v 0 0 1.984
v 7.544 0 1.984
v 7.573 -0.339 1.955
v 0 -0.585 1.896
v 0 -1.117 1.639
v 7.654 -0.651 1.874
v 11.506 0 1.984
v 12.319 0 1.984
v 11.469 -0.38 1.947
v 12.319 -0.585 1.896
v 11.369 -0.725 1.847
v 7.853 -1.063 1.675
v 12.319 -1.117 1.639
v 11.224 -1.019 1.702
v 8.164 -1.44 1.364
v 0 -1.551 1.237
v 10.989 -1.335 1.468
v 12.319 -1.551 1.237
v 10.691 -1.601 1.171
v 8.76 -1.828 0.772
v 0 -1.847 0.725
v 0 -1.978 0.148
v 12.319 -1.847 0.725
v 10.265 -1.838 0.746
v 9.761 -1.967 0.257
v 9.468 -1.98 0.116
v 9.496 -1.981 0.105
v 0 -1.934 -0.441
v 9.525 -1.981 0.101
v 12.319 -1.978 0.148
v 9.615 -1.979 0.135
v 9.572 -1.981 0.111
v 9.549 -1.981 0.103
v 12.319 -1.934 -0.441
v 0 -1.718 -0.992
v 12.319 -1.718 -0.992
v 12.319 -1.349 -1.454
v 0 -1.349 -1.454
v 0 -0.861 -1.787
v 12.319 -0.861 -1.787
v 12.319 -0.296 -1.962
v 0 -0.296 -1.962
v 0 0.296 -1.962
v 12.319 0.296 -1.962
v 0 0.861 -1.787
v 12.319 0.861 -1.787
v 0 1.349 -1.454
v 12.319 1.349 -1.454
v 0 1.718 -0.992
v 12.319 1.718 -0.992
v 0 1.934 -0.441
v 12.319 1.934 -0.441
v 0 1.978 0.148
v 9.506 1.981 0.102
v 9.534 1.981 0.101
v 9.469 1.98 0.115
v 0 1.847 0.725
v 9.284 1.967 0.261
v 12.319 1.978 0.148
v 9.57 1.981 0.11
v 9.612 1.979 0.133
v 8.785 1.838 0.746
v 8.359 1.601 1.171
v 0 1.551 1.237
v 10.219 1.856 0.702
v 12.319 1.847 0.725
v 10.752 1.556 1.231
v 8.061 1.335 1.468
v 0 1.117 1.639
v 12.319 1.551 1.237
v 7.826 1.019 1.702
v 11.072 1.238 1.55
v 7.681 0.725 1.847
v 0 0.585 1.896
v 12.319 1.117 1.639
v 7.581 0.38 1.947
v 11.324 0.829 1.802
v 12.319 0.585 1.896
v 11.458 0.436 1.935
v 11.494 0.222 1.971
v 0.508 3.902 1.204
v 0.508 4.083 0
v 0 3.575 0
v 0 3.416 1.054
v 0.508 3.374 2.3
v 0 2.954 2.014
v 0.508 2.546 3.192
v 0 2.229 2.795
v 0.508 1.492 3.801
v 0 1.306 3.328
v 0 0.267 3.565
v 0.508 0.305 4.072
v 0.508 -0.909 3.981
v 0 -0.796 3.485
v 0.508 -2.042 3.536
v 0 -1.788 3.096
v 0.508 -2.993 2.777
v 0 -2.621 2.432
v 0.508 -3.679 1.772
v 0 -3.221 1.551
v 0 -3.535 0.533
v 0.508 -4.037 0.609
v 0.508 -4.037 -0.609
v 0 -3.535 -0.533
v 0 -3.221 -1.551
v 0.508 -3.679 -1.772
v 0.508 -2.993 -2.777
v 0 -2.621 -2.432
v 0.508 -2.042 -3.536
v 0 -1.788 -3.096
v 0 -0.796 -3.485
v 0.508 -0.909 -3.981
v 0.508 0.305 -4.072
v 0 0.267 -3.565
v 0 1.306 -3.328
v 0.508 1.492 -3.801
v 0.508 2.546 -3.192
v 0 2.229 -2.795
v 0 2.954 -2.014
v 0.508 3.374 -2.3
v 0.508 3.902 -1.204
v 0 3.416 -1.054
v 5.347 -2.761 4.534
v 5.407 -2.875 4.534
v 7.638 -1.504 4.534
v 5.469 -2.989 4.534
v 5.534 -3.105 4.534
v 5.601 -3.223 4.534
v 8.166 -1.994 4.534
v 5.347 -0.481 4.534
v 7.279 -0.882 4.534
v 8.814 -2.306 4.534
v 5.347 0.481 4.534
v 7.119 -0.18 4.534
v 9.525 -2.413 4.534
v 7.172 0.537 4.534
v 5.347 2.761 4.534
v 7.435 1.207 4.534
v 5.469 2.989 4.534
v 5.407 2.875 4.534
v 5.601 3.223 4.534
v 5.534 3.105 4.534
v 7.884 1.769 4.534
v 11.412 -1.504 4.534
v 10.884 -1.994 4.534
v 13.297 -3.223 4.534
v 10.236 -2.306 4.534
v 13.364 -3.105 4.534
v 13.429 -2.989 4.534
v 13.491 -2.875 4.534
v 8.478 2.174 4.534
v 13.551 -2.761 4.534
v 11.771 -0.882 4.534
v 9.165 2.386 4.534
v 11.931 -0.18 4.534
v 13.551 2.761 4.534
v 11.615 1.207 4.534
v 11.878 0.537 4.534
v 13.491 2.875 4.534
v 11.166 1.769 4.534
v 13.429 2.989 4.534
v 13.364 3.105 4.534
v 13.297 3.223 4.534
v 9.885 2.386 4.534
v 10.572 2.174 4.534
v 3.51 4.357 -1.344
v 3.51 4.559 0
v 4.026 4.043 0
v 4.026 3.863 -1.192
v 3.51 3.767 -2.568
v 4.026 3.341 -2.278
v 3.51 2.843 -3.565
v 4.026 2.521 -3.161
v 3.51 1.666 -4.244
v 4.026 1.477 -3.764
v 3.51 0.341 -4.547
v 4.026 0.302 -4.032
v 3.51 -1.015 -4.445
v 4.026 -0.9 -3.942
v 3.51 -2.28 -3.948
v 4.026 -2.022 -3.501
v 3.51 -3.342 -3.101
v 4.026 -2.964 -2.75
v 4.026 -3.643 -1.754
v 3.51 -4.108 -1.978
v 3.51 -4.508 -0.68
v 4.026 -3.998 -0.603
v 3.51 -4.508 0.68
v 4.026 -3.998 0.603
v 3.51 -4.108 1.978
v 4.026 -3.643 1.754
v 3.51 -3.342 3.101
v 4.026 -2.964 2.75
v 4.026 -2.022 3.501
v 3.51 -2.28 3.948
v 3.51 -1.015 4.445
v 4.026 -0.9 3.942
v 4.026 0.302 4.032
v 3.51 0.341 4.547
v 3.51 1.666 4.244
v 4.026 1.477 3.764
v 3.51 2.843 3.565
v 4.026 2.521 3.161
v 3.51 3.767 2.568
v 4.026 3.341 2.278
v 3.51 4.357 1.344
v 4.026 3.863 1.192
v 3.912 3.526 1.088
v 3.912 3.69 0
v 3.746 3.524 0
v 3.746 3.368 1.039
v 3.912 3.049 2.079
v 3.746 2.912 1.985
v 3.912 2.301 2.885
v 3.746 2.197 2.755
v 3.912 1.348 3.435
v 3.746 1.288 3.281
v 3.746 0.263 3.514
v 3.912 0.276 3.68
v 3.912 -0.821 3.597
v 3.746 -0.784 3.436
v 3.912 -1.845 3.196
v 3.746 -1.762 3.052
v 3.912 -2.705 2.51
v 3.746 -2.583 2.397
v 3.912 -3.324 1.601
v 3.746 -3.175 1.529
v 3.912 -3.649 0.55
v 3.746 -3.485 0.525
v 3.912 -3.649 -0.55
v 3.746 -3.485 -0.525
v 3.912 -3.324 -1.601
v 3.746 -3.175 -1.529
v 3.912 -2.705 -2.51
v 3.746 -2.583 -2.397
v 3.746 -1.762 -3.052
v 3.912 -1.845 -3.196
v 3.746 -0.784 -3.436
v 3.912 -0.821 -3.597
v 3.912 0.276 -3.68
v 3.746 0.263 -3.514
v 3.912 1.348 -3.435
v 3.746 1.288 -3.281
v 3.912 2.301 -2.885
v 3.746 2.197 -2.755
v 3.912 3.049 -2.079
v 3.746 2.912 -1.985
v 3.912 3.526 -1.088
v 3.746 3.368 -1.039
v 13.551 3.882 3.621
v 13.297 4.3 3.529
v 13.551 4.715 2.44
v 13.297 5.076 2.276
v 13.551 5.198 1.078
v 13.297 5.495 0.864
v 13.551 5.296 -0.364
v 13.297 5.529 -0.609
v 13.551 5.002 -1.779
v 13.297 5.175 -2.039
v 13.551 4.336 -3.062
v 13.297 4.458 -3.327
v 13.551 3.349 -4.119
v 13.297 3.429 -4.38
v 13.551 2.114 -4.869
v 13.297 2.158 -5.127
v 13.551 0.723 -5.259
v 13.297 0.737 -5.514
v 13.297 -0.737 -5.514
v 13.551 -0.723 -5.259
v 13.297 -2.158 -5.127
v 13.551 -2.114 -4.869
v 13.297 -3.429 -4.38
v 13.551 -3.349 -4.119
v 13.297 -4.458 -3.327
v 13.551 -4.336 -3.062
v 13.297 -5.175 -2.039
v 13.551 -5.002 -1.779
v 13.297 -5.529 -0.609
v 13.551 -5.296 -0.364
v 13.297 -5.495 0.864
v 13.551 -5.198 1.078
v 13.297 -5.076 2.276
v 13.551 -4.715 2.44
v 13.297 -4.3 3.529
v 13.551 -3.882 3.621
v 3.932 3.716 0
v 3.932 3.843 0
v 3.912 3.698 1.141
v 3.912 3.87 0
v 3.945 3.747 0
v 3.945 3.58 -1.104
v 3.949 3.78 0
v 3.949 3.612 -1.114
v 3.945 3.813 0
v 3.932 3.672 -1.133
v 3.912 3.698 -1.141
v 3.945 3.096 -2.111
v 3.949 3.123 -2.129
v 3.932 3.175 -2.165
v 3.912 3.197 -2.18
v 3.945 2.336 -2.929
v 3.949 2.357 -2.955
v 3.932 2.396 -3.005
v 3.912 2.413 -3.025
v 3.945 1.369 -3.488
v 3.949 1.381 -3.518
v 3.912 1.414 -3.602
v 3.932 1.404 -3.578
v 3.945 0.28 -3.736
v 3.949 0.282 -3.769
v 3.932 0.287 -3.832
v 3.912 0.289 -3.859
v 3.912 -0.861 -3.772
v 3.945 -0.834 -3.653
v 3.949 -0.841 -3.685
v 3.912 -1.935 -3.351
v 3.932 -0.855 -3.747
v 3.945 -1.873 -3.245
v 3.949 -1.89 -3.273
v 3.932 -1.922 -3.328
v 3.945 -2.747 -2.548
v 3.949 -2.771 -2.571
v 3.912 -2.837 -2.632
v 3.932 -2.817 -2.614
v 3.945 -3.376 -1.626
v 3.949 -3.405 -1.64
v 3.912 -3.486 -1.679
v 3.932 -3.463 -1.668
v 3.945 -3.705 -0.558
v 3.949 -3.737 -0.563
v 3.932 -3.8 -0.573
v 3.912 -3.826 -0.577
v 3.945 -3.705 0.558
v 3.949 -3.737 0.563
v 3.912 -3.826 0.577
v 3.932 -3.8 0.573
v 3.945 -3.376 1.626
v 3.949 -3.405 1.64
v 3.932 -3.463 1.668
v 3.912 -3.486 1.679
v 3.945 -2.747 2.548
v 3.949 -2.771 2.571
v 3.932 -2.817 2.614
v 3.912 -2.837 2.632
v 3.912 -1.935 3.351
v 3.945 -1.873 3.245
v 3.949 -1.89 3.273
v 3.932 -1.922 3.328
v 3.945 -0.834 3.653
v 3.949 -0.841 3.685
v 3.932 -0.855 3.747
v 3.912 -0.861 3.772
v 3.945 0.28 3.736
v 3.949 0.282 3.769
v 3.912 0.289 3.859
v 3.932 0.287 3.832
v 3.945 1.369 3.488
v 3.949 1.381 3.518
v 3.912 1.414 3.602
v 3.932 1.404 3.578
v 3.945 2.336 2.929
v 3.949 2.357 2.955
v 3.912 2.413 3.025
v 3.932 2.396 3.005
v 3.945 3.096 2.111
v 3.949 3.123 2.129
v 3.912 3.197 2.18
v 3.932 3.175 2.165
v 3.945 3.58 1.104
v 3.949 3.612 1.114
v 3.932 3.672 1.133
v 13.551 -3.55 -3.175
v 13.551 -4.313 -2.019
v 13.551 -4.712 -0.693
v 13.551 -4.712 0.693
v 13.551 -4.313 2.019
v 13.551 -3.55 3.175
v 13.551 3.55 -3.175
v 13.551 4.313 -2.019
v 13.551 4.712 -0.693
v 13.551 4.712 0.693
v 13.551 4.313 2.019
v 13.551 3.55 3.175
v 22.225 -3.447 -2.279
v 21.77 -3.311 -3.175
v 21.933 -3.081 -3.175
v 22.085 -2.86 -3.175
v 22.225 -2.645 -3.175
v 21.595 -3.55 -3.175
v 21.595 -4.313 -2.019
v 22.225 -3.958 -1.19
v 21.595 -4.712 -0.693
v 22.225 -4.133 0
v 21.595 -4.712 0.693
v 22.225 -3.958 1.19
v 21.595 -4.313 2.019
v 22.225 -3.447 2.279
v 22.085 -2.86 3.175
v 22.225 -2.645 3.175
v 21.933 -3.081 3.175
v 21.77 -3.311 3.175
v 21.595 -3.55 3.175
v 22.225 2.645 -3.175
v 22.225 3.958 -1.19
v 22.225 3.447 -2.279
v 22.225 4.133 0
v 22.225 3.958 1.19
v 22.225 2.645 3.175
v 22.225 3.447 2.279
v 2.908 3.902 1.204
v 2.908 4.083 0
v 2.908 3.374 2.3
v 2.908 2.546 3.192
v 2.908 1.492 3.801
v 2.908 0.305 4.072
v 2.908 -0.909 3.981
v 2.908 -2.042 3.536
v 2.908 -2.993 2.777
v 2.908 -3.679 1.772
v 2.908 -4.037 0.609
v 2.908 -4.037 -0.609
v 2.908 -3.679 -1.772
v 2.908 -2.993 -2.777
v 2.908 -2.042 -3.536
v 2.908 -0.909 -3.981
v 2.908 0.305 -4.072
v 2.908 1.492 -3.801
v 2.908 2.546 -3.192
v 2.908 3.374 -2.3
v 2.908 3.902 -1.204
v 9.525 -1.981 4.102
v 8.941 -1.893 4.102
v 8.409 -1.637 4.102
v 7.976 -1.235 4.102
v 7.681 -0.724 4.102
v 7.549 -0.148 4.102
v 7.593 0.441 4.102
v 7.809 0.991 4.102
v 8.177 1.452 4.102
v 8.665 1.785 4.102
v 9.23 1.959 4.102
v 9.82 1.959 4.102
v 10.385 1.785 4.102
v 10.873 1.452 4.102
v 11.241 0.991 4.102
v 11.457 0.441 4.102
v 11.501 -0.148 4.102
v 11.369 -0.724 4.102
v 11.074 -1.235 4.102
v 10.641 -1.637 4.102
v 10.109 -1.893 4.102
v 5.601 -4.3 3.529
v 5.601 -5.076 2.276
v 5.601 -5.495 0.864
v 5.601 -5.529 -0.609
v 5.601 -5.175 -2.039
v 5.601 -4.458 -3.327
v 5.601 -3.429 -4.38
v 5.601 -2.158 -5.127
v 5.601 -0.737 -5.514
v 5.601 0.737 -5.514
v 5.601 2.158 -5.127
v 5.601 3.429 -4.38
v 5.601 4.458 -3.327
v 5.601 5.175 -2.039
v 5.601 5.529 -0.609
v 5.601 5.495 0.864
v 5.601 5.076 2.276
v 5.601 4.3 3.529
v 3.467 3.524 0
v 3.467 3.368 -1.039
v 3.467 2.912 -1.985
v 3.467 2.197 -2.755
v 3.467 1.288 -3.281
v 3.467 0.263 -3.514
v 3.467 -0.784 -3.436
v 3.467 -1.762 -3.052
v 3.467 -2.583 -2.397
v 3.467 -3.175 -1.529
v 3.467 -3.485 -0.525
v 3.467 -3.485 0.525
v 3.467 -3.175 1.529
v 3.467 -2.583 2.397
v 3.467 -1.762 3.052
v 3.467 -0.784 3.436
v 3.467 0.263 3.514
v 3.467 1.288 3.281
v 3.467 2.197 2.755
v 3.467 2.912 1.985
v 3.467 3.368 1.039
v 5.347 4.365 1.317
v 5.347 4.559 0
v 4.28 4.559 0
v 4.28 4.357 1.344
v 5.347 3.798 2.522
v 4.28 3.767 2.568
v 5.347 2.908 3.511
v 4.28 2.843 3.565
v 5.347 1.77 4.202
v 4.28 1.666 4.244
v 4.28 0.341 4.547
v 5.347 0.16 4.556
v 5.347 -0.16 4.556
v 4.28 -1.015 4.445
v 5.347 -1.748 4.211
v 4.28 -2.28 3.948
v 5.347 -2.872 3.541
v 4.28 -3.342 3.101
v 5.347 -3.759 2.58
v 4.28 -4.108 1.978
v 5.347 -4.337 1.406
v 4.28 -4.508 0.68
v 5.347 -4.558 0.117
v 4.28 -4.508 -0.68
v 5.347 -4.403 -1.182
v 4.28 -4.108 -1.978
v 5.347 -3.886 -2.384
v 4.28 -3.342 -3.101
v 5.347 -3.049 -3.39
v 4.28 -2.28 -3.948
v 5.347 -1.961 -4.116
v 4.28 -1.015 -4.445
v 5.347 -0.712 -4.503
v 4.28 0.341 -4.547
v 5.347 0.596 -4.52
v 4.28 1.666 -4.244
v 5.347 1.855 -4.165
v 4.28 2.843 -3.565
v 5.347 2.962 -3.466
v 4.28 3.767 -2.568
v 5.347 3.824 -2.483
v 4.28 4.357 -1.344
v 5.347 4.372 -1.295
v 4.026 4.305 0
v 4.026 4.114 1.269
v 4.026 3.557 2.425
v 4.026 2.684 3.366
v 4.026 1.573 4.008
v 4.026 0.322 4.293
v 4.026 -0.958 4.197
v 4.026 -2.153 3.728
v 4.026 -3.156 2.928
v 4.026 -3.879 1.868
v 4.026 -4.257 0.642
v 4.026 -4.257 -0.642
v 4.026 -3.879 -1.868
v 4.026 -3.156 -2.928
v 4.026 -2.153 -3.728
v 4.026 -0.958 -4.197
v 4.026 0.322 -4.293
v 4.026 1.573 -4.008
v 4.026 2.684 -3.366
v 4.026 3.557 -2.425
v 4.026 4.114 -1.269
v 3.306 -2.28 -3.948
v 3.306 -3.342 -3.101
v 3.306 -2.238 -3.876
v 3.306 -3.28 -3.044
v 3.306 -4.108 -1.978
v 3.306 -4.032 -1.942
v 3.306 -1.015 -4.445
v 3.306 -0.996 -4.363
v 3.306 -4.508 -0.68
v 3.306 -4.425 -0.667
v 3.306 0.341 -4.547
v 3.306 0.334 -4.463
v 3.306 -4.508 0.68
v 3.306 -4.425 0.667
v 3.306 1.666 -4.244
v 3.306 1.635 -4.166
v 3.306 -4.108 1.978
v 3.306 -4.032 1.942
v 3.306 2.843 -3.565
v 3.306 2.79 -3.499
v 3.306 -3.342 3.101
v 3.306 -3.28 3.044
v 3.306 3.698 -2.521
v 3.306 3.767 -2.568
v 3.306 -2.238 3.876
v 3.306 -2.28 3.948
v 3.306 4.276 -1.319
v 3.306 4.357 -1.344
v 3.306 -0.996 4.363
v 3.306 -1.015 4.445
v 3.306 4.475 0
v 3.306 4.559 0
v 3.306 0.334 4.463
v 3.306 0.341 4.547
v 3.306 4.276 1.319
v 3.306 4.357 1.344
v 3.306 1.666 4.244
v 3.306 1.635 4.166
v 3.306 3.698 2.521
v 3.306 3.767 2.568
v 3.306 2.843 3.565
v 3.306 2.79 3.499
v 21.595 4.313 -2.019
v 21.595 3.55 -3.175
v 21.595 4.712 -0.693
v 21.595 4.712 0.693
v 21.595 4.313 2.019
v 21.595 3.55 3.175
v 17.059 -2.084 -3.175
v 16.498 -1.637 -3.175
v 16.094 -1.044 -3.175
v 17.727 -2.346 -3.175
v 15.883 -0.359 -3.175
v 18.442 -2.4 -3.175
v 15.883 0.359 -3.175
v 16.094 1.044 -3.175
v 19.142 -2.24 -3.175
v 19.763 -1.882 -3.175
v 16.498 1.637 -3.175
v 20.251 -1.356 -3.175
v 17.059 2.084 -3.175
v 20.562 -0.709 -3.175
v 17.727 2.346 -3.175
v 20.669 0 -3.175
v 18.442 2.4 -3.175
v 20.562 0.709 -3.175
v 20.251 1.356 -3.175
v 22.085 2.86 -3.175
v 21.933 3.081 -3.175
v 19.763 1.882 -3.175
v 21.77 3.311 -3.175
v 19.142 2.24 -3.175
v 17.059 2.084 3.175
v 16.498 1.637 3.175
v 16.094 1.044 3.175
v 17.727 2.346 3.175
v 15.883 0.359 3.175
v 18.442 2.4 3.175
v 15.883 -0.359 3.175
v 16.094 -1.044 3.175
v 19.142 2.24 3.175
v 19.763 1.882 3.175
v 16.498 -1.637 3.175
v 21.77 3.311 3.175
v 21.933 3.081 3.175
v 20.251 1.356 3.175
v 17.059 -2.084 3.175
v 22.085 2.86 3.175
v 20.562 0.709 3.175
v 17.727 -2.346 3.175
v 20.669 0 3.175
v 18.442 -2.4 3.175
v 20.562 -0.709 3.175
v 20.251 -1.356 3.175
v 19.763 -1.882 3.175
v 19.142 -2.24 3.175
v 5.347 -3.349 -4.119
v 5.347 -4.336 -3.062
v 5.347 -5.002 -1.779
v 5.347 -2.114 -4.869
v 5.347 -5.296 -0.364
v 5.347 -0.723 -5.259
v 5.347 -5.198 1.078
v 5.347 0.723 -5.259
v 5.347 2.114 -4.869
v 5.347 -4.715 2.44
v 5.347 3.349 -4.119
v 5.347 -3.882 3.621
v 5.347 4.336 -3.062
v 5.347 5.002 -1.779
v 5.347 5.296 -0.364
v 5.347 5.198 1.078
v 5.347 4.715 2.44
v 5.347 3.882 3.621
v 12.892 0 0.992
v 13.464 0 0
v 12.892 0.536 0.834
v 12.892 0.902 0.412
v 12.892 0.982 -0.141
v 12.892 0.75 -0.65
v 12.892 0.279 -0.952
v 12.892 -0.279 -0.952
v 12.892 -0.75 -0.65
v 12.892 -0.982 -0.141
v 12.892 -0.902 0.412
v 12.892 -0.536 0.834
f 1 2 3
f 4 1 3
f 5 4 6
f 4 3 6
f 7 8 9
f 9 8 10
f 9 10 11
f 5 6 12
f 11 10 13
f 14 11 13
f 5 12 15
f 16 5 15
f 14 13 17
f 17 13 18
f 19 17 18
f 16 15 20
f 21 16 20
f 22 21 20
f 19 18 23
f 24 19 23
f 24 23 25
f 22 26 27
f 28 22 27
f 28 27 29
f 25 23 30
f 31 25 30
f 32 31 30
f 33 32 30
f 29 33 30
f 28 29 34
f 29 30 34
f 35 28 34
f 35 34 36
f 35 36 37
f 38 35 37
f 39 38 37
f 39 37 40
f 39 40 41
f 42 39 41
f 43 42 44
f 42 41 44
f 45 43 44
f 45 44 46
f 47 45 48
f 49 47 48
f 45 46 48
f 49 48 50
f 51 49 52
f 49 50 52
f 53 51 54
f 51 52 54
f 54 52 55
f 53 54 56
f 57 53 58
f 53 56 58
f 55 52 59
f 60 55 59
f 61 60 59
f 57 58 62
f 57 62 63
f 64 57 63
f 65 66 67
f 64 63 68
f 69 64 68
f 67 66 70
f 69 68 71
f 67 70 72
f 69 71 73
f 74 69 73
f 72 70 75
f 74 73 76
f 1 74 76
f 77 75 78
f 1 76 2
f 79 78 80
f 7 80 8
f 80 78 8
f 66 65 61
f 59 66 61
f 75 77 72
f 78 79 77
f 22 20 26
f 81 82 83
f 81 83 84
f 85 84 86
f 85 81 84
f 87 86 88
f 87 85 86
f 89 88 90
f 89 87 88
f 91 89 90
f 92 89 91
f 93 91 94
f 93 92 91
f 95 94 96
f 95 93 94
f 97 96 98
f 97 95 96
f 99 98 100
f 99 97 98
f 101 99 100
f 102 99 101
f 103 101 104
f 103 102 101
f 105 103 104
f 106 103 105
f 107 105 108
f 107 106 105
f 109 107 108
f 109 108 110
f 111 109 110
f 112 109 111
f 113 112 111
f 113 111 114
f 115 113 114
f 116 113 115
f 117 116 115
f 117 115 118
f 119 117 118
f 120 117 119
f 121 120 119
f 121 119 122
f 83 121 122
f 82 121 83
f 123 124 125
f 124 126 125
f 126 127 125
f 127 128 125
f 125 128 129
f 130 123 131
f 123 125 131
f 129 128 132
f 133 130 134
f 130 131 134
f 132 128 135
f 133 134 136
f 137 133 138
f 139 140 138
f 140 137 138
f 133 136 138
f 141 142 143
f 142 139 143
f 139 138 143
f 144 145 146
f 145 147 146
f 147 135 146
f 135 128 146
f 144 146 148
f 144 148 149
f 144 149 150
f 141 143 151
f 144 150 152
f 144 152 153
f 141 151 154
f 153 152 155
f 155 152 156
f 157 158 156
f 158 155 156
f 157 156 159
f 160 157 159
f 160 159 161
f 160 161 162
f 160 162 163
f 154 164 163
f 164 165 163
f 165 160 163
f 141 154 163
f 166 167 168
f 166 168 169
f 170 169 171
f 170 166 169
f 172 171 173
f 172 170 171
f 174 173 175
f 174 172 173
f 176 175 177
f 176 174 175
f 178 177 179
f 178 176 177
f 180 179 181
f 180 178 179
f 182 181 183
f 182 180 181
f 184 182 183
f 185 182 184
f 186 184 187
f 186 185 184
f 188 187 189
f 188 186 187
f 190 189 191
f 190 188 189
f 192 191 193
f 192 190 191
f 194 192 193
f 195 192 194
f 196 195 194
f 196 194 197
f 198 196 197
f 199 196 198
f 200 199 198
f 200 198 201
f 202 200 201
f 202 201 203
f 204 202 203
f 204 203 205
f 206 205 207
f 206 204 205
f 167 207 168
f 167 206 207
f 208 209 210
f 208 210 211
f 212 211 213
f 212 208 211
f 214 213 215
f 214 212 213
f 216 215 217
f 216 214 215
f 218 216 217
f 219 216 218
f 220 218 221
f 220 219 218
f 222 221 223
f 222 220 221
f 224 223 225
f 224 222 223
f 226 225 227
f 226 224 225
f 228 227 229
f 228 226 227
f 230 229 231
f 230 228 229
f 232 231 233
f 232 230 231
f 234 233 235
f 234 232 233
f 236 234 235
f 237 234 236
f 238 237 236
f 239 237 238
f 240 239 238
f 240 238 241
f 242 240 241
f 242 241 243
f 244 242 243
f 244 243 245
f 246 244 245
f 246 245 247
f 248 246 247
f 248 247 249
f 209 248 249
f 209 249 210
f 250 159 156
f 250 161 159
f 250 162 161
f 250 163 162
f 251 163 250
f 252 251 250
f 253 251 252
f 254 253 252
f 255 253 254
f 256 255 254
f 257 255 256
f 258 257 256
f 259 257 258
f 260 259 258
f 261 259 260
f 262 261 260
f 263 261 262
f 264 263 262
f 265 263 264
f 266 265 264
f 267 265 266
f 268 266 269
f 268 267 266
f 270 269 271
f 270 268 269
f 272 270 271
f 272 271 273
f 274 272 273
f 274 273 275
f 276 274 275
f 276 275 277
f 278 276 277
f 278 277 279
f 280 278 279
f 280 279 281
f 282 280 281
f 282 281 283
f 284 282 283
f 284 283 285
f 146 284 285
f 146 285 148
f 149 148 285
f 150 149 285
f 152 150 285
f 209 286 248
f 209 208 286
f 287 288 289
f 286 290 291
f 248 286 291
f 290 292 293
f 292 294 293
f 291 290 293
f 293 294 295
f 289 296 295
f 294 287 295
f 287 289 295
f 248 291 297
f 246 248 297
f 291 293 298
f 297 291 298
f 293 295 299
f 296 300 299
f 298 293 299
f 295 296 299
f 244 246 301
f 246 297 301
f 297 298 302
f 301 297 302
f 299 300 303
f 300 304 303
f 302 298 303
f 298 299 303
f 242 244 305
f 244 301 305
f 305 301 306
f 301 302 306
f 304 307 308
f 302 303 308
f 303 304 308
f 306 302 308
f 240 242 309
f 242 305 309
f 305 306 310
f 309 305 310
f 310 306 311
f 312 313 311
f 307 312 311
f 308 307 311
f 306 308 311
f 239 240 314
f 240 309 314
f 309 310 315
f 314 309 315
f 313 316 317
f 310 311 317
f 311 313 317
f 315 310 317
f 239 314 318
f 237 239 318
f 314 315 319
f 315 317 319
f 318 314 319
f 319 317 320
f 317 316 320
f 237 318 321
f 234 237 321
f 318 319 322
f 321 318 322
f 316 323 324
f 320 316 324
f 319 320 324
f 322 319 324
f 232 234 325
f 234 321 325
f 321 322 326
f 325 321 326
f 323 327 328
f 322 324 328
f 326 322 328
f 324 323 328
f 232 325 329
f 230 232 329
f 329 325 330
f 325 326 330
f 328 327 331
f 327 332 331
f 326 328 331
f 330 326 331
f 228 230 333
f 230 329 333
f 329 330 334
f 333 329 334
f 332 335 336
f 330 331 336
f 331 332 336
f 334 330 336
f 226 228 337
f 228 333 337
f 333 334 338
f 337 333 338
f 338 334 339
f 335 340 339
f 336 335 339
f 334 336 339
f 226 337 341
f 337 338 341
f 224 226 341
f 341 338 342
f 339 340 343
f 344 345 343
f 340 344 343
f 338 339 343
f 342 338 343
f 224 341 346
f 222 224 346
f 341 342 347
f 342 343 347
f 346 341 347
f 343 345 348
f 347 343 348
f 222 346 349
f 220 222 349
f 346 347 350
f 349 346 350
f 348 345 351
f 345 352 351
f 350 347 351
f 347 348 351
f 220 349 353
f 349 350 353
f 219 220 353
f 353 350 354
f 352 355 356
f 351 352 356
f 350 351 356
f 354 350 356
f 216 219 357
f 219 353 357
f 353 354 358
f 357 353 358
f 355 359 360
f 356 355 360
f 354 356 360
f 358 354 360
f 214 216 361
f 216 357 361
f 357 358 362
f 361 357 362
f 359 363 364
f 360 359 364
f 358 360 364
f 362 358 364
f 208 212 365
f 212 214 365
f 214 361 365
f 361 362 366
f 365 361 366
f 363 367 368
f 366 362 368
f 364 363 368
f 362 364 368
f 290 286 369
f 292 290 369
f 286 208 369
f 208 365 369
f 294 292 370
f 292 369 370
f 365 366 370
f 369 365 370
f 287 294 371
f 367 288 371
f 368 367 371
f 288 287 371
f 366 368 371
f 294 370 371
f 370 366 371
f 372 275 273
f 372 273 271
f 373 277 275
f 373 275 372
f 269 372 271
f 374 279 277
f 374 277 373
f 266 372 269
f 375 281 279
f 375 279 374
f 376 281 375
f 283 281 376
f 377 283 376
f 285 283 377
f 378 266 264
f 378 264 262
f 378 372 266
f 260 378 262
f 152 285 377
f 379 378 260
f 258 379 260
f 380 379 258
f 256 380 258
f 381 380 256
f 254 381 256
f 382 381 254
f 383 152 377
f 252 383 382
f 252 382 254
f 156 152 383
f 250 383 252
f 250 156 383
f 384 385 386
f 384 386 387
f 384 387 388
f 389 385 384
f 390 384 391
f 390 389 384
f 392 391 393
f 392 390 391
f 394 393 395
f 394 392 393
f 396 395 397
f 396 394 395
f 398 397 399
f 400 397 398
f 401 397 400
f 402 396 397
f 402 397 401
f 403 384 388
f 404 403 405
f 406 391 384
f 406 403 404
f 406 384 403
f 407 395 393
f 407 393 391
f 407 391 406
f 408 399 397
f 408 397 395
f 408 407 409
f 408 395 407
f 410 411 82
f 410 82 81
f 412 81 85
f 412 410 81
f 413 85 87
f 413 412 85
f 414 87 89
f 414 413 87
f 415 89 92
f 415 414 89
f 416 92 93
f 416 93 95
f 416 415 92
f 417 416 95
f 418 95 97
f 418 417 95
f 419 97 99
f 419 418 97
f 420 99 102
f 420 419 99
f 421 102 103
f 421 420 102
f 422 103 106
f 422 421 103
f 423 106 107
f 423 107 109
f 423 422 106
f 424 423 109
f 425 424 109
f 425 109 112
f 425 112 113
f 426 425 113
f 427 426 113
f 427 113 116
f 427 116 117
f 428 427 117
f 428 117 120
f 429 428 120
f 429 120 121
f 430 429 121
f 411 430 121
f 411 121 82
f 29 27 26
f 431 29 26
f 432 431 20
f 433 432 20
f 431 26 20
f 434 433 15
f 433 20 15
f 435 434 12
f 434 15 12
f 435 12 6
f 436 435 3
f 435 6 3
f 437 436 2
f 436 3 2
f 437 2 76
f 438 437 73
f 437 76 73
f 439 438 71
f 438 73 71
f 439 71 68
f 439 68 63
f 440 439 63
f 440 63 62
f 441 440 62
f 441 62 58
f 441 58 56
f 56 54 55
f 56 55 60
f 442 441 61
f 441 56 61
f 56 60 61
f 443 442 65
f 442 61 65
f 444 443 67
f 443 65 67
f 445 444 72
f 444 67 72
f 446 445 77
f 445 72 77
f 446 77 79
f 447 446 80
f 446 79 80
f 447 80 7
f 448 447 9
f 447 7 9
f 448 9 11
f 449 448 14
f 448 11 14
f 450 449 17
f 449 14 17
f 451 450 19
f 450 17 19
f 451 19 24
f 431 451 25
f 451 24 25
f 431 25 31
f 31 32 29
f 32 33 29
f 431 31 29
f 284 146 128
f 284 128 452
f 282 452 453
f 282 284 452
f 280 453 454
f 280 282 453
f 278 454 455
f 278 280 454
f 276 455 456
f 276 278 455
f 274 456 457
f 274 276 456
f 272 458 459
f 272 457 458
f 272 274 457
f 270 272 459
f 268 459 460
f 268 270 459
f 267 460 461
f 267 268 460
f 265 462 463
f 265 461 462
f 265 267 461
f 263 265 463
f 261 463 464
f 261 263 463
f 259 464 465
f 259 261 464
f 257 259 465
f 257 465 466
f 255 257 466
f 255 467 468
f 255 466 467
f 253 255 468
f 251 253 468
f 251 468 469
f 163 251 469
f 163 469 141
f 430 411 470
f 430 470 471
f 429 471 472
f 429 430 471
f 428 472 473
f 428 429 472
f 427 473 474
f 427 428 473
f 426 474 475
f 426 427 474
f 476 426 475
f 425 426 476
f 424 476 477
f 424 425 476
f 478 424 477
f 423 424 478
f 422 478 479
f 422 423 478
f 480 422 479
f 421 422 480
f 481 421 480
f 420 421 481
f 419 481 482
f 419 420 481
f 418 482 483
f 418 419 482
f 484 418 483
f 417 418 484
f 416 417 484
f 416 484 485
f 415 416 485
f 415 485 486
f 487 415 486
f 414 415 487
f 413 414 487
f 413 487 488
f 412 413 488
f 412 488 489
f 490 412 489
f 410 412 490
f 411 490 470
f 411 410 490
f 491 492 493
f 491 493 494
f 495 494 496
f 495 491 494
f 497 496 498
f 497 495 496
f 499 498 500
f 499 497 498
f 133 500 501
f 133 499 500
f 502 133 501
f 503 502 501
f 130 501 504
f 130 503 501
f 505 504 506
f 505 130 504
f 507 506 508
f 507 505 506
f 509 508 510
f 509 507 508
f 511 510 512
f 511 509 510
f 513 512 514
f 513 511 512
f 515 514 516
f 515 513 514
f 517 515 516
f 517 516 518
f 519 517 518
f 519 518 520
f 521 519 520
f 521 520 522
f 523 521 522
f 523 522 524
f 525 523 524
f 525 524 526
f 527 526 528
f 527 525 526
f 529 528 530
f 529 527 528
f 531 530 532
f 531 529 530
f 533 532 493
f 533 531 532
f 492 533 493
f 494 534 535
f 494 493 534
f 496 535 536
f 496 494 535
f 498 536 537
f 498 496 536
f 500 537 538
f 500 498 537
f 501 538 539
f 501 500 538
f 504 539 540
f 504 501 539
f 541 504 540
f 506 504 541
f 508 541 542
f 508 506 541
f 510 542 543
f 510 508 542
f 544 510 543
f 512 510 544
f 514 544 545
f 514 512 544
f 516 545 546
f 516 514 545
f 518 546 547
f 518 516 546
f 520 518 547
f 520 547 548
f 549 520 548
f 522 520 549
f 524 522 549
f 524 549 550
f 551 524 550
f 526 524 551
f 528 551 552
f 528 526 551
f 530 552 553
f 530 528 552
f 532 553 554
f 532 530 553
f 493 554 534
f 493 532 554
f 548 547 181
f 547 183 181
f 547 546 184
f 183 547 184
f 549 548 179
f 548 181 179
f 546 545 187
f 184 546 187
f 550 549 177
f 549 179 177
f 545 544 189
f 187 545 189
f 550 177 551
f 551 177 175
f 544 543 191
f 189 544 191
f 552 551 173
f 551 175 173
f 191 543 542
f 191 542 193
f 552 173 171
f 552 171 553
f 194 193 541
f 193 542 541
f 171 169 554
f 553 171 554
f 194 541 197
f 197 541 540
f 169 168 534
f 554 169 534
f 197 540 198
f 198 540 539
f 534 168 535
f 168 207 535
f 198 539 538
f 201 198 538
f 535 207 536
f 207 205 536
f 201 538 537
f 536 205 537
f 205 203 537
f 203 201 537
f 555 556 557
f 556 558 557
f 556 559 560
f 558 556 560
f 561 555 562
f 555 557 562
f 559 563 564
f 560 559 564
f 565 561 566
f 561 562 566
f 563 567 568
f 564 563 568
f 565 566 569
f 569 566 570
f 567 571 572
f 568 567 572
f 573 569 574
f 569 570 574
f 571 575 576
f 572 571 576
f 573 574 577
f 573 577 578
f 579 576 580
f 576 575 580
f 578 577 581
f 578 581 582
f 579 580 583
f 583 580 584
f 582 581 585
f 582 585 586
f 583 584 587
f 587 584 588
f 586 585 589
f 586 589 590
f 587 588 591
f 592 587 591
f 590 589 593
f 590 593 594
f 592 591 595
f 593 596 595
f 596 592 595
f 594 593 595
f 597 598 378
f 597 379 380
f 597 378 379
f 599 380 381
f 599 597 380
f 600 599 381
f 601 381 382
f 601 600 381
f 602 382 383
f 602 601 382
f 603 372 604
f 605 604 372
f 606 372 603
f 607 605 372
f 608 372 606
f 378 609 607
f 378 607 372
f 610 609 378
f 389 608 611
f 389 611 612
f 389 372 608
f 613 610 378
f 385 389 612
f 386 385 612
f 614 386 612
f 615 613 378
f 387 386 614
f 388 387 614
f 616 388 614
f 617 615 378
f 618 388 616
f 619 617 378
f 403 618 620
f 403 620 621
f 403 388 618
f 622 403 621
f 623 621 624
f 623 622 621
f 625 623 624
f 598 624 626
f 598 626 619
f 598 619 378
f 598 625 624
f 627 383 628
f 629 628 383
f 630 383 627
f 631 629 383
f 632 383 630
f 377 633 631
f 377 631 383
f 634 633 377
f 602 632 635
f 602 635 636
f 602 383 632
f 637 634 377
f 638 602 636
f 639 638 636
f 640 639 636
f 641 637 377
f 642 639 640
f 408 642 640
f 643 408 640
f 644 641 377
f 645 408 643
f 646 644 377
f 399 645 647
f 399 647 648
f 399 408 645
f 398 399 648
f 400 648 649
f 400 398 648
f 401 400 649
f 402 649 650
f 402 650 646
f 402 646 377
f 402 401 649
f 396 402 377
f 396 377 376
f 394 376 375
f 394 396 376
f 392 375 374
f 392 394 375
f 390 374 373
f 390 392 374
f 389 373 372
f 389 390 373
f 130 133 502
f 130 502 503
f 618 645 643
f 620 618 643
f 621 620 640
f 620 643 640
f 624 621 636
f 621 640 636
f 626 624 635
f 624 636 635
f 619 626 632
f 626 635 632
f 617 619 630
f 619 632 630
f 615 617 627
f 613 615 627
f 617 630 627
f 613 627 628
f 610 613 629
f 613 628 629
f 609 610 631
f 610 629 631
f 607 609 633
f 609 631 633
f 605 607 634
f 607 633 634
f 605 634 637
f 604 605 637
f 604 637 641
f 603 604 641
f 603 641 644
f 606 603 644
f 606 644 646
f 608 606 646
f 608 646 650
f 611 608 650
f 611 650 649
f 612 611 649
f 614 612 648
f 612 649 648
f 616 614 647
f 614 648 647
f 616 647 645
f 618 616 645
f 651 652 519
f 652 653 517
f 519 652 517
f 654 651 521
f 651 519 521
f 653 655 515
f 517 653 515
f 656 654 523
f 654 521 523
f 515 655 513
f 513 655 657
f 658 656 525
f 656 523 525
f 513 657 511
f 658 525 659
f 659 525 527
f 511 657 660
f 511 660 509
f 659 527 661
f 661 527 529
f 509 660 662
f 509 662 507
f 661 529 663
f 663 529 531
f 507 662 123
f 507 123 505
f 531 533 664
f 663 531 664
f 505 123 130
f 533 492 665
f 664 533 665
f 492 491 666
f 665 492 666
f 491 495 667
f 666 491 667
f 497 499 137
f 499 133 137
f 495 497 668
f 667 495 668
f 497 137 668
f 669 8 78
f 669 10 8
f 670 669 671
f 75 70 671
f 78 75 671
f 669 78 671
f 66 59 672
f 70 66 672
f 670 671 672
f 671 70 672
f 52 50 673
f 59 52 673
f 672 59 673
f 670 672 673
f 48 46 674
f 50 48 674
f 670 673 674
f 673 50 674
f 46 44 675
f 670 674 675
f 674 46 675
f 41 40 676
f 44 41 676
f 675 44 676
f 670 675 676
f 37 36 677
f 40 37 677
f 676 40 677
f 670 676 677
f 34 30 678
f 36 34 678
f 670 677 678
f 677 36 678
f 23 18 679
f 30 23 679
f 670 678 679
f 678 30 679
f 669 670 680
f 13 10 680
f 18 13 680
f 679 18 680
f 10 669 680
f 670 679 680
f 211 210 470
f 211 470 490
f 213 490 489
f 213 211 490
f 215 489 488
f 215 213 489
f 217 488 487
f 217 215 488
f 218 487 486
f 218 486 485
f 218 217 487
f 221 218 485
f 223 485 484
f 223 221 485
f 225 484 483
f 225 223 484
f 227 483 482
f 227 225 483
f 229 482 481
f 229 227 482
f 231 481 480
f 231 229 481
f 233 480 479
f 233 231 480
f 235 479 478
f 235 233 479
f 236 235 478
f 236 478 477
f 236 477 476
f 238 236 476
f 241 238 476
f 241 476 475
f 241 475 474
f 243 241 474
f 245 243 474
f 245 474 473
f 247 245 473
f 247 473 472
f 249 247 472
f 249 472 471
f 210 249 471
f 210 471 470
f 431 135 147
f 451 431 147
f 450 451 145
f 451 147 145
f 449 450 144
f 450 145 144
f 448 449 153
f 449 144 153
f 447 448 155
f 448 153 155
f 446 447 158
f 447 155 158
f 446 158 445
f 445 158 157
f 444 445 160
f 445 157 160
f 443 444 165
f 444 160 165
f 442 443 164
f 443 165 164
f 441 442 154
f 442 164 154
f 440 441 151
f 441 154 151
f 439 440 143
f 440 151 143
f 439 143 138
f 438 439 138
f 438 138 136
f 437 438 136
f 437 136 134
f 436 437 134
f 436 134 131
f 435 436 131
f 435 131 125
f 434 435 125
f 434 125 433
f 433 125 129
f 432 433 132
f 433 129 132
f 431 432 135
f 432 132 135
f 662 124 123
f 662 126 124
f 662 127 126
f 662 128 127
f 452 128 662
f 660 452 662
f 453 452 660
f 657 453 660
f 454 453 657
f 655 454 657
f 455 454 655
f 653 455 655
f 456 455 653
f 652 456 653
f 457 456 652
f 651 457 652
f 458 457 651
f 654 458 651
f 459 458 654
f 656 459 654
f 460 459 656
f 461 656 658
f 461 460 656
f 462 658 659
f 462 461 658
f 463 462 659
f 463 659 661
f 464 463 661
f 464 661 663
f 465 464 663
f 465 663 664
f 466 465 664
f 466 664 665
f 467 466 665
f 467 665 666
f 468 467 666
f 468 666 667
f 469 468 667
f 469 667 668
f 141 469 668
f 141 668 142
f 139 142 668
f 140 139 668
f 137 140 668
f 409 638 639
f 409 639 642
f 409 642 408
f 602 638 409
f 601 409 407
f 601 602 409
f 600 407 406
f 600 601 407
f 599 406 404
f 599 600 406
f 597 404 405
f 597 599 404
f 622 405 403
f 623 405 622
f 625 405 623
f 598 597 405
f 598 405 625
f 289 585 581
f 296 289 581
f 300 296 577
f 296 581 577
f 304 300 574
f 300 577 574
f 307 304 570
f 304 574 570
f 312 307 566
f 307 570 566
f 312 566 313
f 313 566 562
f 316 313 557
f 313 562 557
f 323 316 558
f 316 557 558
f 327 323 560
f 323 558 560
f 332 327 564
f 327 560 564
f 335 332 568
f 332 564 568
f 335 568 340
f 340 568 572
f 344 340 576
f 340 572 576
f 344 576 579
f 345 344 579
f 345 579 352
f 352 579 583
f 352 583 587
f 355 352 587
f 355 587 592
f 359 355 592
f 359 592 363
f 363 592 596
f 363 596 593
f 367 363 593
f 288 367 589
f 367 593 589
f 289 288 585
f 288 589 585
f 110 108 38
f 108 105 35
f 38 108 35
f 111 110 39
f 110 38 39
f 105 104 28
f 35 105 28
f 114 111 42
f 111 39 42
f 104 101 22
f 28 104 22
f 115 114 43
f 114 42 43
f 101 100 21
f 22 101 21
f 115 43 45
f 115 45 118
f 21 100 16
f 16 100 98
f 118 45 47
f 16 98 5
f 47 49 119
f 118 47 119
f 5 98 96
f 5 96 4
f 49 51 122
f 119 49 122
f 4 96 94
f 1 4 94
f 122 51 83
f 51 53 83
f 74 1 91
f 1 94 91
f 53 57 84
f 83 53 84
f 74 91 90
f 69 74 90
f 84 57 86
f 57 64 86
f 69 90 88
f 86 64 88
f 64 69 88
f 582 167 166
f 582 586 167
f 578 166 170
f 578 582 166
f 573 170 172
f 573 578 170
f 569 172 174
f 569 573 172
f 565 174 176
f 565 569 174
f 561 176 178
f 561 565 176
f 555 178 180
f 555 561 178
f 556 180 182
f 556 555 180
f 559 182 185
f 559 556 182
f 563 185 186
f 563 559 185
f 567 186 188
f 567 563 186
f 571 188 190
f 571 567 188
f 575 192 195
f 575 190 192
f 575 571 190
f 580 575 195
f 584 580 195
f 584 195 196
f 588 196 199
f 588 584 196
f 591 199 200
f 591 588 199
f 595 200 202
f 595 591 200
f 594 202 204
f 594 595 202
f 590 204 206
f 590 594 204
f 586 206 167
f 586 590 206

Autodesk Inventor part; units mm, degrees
sketch "Sketch_8" plane through (0, 0, 0) normal (0, 0, 1) x (1, 0, 0)
  line L0 (13.5509, 0) -> (0, 0)
  line L1 (0, 0) -> (0, 3.5751)
  line L2 (0, 3.5751) -> (0.508, 4.0831)
  line L3 (0.508, 4.0831) -> (2.9083, 4.0831)
  line L4 (2.9083, 4.0831) -> (3.4671, 3.5242)
  line L5 (3.4671, 3.5242) -> (4.0259, 3.5242)
  line L6 (4.0259, 3.5242) -> (4.0259, 4.3053)
  line L7 (4.0259, 4.3053) -> (4.2799, 4.5593)
  line L8 (4.2799, 4.5593) -> (5.3467, 4.5593)
  line L9 (5.3467, 4.5593) -> (5.3467, 5.3086)
  line L10 (5.3467, 5.3086) -> (5.6007, 5.5626)
  line L11 (5.6007, 5.5626) -> (13.2969, 5.5626)
  line L12 (13.2969, 5.5626) -> (13.5509, 5.3086)
  line L13 (13.5509, 5.3086) -> (13.5509, 0)
  line L14 (13.5509, 0) -> (0, 0)
revolve "Revolution1" add sketch "Sketch_8" angle 360 about axis through (13.5509, 0, 0) along (1, 0, 0)
sketch "Sketch_14" plane through (0, 0, 0) normal (0, 0, 1) x (1, 0, 0)
  line L0 (22.225, 0) -> (13.5509, 0)
  line L1 (13.5509, 0) -> (13.5509, 4.7625)
  line L2 (13.5509, 4.7625) -> (21.5951, 4.7625)
  line L3 (21.5951, 4.7625) -> (22.225, 4.1326)
  line L4 (22.225, 4.1326) -> (22.225, 0)
  line L5 (22.225, 0) -> (13.5509, 0)
revolve "Revolution2" add sketch "Sketch_14" angle 360 about axis through (22.225, 0, 0) along (1, 0, 0)
thread "Thread1" size "3/8-24 UNF" class "2A" standard "ANSI Unified Screw Threads" full length
sketch "Sketch_9" plane through (22.225, 0, 0) normal (1, 0, 0) x (0, 0, -1)
  line L0 (-11.1252, -22.2504) -> (11.1252, -22.2504)
  line L1 (11.1252, -22.2504) -> (11.1252, 22.2504)
  line L2 (11.1252, 22.2504) -> (-11.1252, 22.2504)
  line L3 (-11.1252, 22.2504) -> (-11.1252, -22.2504)
  line L4 (-3.175, -11.1252) -> (3.175, -11.1252)
  line L5 (3.175, -11.1252) -> (3.175, 11.1252)
  line L6 (3.175, 11.1252) -> (-3.175, 11.1252)
  line L7 (-3.175, 11.1252) -> (-3.175, -11.1252)
extrude "Extrusion1" cut sketch "Sketch_9" against normal blind 8.6741
sketch "Sketch_44" plane through (13.5509, 0, 0) normal (1, 0, 0) x (0, 0, -1)
  line L0 (-10.0965, 5.5626) -> (-10.0965, -5.5626)
  line L1 (-10.0965, -5.5626) -> (-4.5339, -5.5626)
  line L2 (-4.5339, -5.5626) -> (-4.5339, 5.5626)
  line L3 (-4.5339, 5.5626) -> (-10.0965, 5.5626)
extrude "Extrusion2" cut sketch "Sketch_44" against normal blind 8.2042
sketch "Sketch5" plane through (0, 0, 0) normal (-1, 0, 0) x (0, 0, 1)
  point P0 (0, 0)
hole "Drilling 1" at (0, 0, 0) direction (1, 0, 0) diameter 3.9675 depth 12.319 tip angle 120
sketch "Sketch6" plane through (5.6007, 3.2228, 4.5339) normal (0, 0, 1) x (1, 0, 0)
  point P0 (3.9243, -3.2228)
hole "Drilling 2" at (9.525, 0, 4.5339) direction (0, 0, -1) diameter 3.9624 depth 4.5339 countersink diameter 4.826 countersink angle 90 thread size "10-32 UNF" class "2B" standard "ANSI Unified Screw Threads"
sketch "Sketch_24" plane through (0, 0, 0) normal (0, 0, 1) x (1, 0, 0)
  line L0 (4.0259, 0) -> (3.4671, 0)
  line L1 (3.3065, 4.4751) -> (3.9121, 3.8695)
  arc A0 (3.9121, 3.6899) -> (3.9121, 3.8695) centre (3.8223, 3.7797) ccw
  line L2 (3.9121, 3.6899) -> (3.7465, 3.5242)
  line L3 (3.7465, 3.5242) -> (3.4671, 3.5242)
  line L4 (3.4671, 3.5242) -> (3.4671, 3.2702)
  line L5 (3.4671, 3.2702) -> (4.0259, 3.2702)
  line L6 (4.0259, 3.2702) -> (4.0259, 4.0431)
  line L7 (4.0259, 4.0431) -> (3.5097, 4.5593)
  line L8 (3.5097, 4.5593) -> (3.3065, 4.5593)
  line L9 (3.3065, 4.5593) -> (3.3065, 4.4751)
revolve "Revolution3" add sketch "Sketch_24" angle 360 about axis through (4.0259, 0, 0) along (1, 0, 0)
sketch "Sketch_43" plane through (0, 0, 0) normal (0, 0, 1) x (1, 0, 0)
  circle A0 centre (18.2626, 0) radius 2.4066
extrude "Extrusion3" cut sketch "Sketch_43" along normal mid plane 9.525
ref_plane "to_tube_XY" through (3.4671, 0, 0) normal (1, 0, 0) x (0, 0, -1)
ref_plane "to_tube_YZ" through (3.4671, 0, 0) normal (0, 0, -1) x (0, 1, 0)
ref_plane "to_tube_ZX" through (3.4671, 0, 0) normal (0, 1, 0) x (1, 0, 0)
ref_plane "to_nut_XY" through (13.5509, 0, 0) normal (1, 0, 0) x (0, 0, -1)
ref_plane "to_nut_YZ" through (13.5509, 0, 0) normal (0, 0, -1) x (0, 1, 0)
ref_plane "to_nut_ZX" through (13.5509, 0, 0) normal (0, 1, 0) x (1, 0, 0)
ref_plane "lovra1_XY" through (22.225, 0, 0) normal (1, 0, 0) x (0, 0, -1)
ref_plane "lovra1_YZ" through (22.225, 0, 0) normal (0, 0, -1) x (0, 1, 0)
ref_plane "lovra1_ZX" through (22.225, 0, 0) normal (0, 1, 0) x (1, 0, 0)
ref_plane "lovra2_XY" through (22.225, 0, 0) normal (1, 0, 0) x (0, 0, -1)
ref_plane "lovra2_YZ" through (22.225, 0, 0) normal (0, 0, -1) x (0, 1, 0)
ref_plane "lovra2_ZX" through (22.225, 0, 0) normal (0, 1, 0) x (1, 0, 0)
ref_plane "lovra3_XY" through (22.225, 0, 0) normal (1, 0, 0) x (0, 0, -1)
ref_plane "lovra3_YZ" through (22.225, 0, 0) normal (0, 0, -1) x (0, 1, 0)
ref_plane "lovra3_ZX" through (22.225, 0, 0) normal (0, 1, 0) x (1, 0, 0)
ref_plane "to_pin_XY" through (18.2626, 0, 0) normal (0, 0, 1) x (1, 0, 0)
ref_plane "to_pin_YZ" through (18.2626, 0, 0) normal (1, 0, 0) x (0, 1, 0)
ref_plane "to_pin_ZX" through (18.2626, 0, 0) normal (0, 1, 0) x (0, 0, 1)
ref_plane "olen_XY" through (18.2626, 0, 0) normal (1, 0, 0) x (0, 0, -1)
ref_plane "olen_YZ" through (18.2626, 0, 0) normal (0, 0, -1) x (0, 1, 0)
ref_plane "olen_ZX" through (18.2626, 0, 0) normal (0, 1, 0) x (1, 0, 0)
ref_plane "thd1_XY" through (22.225, 0, 4.7625) normal (1, 0, 0) x (0, 0, -1)
ref_plane "thd1_YZ" through (22.225, 0, 4.7625) normal (0, 0, -1) x (0, 1, 0)
ref_plane "thd1_ZX" through (22.225, 0, 4.7625) normal (0, 1, 0) x (1, 0, 0)
ref_plane "p1_XY" through (22.225, 0, 3.175) normal (1, 0, 0) x (0, 0, -1)
ref_plane "p1_YZ" through (22.225, 0, 3.175) normal (0, 0, -1) x (0, 1, 0)
ref_plane "p1_ZX" through (22.225, 0, 3.175) normal (0, 1, 0) x (1, 0, 0)
ref_plane "thd2_XY" through (22.225, 0, -4.7625) normal (1, 0, 0) x (0, 0, -1)
ref_plane "thd2_YZ" through (22.225, 0, -4.7625) normal (0, 0, -1) x (0, 1, 0)
ref_plane "thd2_ZX" through (22.225, 0, -4.7625) normal (0, 1, 0) x (1, 0, 0)
ref_plane "p2_XY" through (22.225, 0, -3.175) normal (1, 0, 0) x (0, 0, -1)
ref_plane "p2_YZ" through (22.225, 0, -3.175) normal (0, 0, -1) x (0, 1, 0)
ref_plane "p2_ZX" through (22.225, 0, -3.175) normal (0, 1, 0) x (1, 0, 0)
ref_plane "port2_XY" through (22.225, 0, 0) normal (1, 0, 0) x (0, 0, -1)
ref_plane "port2_YZ" through (22.225, 0, 0) normal (0, 0, -1) x (0, 1, 0)
ref_plane "port2_ZX" through (22.225, 0, 0) normal (0, 1, 0) x (1, 0, 0)
ref_plane "port_XY" through (9.525, 0, 0) normal (0, 0, 1) x (1, 0, 0)
ref_plane "port_YZ" through (9.525, 0, 0) normal (1, 0, 0) x (0, 1, 0)
ref_plane "port_ZX" through (9.525, 0, 0) normal (0, 1, 0) x (0, 0, 1)
ref_plane "1_XY" through (13.5509, 0, 0) normal (1, 0, 0) x (0, 0, -1)
ref_plane "1_YZ" through (13.5509, 0, 0) normal (0, 0, -1) x (0, 1, 0)
ref_plane "1_ZX" through (13.5509, 0, 0) normal (0, 1, 0) x (1, 0, 0)
ref_plane "lovra21_XY" through (0, 0, 5.2705) normal (1, 0, 0) x (0, 0, -1)
ref_plane "lovra21_YZ" through (0, 0, 5.2705) normal (0, 0, -1) x (0, 1, 0)
ref_plane "lovra21_ZX" through (0, 0, 5.2705) normal (0, 1, 0) x (1, 0, 0)
ref_plane "lovra22_XY" through (0, 0, -5.2705) normal (1, 0, 0) x (0, 0, -1)
ref_plane "lovra22_YZ" through (0, 0, -5.2705) normal (0, 0, -1) x (0, 1, 0)
ref_plane "lovra22_ZX" through (0, 0, -5.2705) normal (0, 1, 0) x (1, 0, 0)
ref_plane "to_screw_XY" through (9.525, 0, 0) normal (0, 1, 0) x (1, 0, 0)
ref_plane "to_screw_YZ" through (9.525, 0, 0) normal (1, 0, 0) x (0, 0, -1)
ref_plane "to_screw_ZX" through (9.525, 0, 0) normal (0, 0, -1) x (0, 1, 0)
ref_plane "to_mounting_bracket_XY" through (13.5509, 0, 0) normal (1, 0, 0) x (0, 0, -1)
ref_plane "to_mounting_bracket_YZ" through (13.5509, 0, 0) normal (0, 0, -1) x (0, 1, 0)
ref_plane "to_mounting_bracket_ZX" through (13.5509, 0, 0) normal (0, 1, 0) x (1, 0, 0)
properties part number "007P0Y000_rear_head"
